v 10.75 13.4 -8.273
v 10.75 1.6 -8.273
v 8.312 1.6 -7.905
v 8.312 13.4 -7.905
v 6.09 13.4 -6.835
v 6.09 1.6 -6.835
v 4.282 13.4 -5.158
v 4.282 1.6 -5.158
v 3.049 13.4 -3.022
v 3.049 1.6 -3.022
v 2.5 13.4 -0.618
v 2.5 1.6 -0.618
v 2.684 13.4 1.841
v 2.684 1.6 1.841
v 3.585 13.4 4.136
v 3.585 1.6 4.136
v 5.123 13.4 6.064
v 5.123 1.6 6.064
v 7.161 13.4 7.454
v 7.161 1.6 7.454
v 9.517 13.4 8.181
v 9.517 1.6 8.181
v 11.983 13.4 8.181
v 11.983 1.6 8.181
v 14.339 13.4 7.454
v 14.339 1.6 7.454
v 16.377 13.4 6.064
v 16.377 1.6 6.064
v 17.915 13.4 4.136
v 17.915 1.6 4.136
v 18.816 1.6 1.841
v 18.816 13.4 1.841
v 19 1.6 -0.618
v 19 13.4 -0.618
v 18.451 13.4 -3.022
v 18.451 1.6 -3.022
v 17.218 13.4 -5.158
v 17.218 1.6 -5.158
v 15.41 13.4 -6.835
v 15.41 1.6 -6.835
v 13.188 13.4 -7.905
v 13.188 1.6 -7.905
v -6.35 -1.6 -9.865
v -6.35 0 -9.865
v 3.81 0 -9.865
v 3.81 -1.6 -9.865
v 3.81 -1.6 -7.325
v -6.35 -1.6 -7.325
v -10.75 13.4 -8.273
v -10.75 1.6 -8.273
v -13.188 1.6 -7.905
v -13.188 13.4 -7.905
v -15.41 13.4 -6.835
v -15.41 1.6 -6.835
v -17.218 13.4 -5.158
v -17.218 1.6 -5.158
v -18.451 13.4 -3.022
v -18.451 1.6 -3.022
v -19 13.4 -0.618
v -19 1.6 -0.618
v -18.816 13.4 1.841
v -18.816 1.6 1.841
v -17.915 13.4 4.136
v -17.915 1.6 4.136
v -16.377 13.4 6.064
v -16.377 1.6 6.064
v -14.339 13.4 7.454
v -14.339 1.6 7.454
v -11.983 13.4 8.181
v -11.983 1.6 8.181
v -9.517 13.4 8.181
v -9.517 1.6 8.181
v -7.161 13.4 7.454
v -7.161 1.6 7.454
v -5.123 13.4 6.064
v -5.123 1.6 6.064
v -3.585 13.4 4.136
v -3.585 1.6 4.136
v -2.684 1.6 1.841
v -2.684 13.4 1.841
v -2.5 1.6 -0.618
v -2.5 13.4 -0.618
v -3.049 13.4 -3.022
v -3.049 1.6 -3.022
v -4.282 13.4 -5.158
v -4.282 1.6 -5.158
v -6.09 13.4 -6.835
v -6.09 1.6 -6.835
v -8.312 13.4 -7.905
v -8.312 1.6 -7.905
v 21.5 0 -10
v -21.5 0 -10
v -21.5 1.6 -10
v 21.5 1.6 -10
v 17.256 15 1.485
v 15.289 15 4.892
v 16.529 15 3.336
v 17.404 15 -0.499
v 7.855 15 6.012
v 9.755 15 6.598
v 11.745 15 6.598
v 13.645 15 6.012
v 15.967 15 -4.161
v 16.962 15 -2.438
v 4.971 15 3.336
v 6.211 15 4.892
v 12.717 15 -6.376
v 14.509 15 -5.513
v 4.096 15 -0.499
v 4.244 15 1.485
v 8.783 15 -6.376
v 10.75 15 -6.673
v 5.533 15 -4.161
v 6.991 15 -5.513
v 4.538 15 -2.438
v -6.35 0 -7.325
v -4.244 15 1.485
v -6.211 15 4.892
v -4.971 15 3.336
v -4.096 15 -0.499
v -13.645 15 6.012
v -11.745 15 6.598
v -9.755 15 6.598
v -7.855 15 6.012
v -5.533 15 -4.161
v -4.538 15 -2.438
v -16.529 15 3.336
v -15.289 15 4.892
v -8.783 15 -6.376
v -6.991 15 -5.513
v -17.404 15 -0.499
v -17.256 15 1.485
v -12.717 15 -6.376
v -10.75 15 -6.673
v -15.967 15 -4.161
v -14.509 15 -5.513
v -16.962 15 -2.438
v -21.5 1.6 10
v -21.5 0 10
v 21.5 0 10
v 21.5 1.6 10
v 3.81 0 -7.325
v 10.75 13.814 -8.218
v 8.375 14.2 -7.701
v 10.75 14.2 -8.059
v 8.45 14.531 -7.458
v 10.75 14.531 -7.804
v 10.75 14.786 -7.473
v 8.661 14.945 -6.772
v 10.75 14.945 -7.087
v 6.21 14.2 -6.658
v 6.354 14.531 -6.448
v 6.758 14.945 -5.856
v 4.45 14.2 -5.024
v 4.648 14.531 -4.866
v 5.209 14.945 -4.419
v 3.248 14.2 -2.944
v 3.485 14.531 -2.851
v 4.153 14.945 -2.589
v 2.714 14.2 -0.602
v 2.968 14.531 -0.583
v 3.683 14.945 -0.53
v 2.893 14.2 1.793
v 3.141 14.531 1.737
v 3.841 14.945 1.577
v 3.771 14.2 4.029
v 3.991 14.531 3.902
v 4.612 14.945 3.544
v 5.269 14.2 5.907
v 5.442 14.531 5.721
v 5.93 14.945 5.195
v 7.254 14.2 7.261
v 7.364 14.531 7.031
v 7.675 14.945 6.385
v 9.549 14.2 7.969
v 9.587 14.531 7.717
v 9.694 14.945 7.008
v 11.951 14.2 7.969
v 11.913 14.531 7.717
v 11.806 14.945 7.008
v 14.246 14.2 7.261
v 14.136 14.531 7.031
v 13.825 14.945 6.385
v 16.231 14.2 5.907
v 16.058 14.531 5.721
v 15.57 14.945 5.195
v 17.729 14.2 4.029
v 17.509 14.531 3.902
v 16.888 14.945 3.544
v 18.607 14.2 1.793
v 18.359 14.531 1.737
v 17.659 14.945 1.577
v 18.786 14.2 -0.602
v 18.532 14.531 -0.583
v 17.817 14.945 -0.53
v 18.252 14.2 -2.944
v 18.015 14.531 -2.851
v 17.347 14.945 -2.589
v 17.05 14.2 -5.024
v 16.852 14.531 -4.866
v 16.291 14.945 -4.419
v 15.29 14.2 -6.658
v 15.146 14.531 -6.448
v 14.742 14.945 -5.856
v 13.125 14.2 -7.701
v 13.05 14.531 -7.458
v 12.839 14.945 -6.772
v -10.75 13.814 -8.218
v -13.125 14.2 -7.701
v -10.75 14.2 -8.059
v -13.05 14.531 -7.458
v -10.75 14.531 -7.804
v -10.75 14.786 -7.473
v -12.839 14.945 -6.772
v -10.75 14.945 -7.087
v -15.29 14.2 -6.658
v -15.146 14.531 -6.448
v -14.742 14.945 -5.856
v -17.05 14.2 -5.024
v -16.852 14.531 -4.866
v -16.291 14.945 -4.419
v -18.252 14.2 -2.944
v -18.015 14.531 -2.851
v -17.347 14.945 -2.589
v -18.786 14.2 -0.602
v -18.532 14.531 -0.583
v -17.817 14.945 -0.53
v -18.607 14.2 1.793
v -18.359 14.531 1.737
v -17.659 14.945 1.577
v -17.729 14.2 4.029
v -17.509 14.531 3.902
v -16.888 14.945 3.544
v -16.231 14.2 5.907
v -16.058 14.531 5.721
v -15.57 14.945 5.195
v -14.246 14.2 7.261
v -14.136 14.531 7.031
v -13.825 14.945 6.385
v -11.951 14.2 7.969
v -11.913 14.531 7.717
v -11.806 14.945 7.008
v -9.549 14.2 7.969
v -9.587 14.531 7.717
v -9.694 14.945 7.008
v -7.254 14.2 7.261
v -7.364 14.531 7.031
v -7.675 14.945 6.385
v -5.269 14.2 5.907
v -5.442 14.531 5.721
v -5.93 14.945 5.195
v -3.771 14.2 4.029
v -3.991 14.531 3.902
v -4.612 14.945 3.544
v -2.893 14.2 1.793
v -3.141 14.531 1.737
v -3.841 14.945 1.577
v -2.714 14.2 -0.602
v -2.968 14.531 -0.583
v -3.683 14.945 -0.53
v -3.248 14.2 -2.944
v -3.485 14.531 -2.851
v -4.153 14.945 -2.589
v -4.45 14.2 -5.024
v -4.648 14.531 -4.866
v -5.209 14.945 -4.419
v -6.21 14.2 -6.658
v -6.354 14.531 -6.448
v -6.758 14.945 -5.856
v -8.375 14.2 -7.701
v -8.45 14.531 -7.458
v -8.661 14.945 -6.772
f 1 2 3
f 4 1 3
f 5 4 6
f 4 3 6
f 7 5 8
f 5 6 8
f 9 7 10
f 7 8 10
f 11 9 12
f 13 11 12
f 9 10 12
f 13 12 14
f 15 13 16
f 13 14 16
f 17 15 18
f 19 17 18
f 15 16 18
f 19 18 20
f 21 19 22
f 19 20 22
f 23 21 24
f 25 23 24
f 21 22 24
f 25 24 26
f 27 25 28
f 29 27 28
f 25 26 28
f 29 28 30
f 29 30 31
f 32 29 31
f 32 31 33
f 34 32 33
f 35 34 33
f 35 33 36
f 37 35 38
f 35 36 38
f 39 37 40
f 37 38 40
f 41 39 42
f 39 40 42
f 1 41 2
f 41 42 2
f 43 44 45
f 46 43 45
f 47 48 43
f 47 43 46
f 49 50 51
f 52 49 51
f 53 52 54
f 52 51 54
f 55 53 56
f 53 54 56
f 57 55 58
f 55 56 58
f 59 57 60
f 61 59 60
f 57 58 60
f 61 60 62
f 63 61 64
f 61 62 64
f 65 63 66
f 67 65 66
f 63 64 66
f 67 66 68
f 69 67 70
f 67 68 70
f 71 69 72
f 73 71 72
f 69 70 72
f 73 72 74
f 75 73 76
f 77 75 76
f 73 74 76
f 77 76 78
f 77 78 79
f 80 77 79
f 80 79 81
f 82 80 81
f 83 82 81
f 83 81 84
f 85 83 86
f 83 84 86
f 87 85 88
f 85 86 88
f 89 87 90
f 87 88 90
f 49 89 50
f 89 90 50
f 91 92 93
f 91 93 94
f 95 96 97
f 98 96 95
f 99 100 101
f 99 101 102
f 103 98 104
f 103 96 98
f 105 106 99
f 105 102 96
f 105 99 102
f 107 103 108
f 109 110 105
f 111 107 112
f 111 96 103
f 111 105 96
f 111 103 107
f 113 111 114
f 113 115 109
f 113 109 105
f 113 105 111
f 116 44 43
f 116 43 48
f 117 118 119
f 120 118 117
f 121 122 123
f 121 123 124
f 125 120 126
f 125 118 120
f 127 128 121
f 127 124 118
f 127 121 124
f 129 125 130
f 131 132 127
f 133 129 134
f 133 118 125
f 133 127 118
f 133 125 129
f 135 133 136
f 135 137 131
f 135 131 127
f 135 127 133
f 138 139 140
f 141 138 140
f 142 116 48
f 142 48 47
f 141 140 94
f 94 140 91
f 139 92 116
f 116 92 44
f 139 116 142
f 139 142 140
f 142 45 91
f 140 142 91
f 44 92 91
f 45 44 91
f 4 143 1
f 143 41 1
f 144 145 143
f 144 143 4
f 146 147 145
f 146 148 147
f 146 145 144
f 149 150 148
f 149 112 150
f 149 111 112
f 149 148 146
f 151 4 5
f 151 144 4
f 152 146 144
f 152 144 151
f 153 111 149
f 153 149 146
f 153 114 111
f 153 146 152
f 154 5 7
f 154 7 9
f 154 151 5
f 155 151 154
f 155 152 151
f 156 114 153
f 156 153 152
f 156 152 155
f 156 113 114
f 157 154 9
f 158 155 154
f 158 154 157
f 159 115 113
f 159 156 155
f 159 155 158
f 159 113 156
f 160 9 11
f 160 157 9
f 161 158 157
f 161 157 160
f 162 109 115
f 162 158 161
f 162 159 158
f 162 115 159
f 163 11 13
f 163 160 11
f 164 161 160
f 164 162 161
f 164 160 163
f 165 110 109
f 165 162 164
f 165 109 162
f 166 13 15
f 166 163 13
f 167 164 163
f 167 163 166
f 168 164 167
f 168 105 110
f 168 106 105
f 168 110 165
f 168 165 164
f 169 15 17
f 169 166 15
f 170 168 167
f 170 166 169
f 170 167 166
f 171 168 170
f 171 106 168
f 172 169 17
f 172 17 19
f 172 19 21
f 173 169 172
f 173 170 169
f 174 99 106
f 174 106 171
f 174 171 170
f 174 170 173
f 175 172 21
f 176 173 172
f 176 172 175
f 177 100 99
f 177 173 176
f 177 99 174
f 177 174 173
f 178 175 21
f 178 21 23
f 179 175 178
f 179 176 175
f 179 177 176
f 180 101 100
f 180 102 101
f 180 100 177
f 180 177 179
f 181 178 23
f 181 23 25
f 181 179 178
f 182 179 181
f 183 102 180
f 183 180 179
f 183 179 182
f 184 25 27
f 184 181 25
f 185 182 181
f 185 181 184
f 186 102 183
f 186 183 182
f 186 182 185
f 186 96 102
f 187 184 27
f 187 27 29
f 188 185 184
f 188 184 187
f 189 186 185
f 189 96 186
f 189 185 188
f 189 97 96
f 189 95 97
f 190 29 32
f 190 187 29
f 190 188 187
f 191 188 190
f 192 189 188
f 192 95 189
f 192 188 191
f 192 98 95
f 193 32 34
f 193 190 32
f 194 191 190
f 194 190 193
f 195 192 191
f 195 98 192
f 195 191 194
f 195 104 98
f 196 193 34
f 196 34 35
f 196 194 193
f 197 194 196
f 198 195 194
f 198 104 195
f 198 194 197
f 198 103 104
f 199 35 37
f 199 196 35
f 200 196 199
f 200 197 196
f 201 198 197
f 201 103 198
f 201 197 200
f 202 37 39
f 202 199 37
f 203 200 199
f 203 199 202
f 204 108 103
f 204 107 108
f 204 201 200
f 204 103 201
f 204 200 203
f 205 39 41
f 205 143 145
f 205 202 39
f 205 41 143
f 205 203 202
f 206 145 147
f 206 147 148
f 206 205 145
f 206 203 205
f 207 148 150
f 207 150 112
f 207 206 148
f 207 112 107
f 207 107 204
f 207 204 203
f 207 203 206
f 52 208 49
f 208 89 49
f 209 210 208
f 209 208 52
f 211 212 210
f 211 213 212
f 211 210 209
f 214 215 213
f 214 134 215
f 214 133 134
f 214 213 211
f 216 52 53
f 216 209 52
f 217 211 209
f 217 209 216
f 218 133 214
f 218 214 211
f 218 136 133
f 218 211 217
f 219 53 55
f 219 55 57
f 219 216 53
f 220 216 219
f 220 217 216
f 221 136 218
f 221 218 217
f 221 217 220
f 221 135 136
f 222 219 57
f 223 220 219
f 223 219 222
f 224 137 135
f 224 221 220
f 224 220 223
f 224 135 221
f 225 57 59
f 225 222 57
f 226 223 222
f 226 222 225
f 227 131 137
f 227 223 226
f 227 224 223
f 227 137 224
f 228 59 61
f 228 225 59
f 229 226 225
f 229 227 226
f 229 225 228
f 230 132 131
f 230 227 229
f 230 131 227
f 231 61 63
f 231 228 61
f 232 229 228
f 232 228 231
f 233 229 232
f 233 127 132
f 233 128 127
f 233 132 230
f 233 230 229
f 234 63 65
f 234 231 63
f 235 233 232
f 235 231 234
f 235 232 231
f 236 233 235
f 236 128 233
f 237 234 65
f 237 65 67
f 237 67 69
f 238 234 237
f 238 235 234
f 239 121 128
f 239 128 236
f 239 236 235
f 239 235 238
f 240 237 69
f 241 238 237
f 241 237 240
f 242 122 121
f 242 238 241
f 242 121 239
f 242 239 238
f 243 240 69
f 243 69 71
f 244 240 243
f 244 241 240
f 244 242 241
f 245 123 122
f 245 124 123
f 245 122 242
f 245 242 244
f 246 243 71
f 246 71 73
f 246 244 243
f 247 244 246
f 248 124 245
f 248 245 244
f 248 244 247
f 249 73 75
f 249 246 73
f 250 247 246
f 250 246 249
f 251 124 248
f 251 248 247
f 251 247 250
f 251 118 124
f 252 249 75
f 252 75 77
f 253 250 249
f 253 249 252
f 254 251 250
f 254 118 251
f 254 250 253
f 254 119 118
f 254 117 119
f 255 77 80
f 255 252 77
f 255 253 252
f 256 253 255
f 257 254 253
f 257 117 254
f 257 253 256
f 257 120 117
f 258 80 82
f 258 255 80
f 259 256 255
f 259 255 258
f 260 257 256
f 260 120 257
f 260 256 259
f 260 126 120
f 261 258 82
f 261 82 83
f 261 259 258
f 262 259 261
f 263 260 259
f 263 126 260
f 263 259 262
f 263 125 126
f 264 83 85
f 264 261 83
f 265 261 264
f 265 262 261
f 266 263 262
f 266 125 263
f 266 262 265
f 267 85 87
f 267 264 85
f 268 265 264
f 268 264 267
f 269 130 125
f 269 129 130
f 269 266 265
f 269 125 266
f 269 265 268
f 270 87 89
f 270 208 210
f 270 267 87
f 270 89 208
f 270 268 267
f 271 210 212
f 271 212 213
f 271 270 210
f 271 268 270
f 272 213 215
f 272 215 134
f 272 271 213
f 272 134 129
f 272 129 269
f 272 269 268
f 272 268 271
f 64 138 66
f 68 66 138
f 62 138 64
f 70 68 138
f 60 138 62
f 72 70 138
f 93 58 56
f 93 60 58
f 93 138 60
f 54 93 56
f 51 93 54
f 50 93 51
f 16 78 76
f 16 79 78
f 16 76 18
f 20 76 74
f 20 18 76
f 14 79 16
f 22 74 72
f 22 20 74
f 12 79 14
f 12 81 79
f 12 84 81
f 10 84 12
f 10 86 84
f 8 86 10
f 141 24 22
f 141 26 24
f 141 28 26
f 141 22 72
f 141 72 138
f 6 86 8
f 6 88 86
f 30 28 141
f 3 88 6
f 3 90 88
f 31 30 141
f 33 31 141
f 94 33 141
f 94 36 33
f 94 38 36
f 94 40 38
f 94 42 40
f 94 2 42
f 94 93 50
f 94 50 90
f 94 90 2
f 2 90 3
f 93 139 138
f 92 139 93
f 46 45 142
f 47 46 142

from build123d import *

# Parameters (mm, degrees)
SKETCH_1_W      = 43
SKETCH_1_H      = 20
EXTRUDE_1_DEPTH = 1.6
SKETCH_2_R      = 8.272930051
EXTRUDE_2_DEPTH = 13.4
FILLET_1_R      = 1.6
SKETCH_9_W      = 10.16
SKETCH_9_H      = 2.54
EXTRUDE_3_DEPTH = 1.6


with BuildPart() as part:
    # 스케치1 → 보스-돌출1 (new body)
    with BuildSketch(Plane(origin=(0, 0, 0), x_dir=(1, 0, 0), z_dir=(0, 1, 0))):
        Rectangle(SKETCH_1_W, SKETCH_1_H)
    extrude(amount=EXTRUDE_1_DEPTH)

    # 스케치2 → 보스-돌출2 (add)
    with BuildSketch(Plane(origin=(0, 1.6, 0), x_dir=(1, 0, 0), z_dir=(0, 1, 0))):
        with Locations(Location((-10.75, 0, 0), (0, 0, 90))):
            Circle(SKETCH_2_R)
        with Locations(Location((10.75, 0, 0), (0, 0, 90))):
            Circle(SKETCH_2_R)
    extrude(amount=EXTRUDE_2_DEPTH)

    # 필렛1
    fillet_1_edges = [part.edges().sort_by_distance(p)[0] for p in [
        (-10.75, 15, 8.272930051),
        (10.75, 15, 8.272930051),
    ]]
    fillet(fillet_1_edges, radius=FILLET_1_R)

    # 스케치9 → 보스-돌출3 (add)
    with BuildSketch(Plane.XZ):
        with Locations((-1.27, -8.59488099)):
            Rectangle(SKETCH_9_W, SKETCH_9_H)
    extrude(amount=EXTRUDE_3_DEPTH)


solid = part.part
